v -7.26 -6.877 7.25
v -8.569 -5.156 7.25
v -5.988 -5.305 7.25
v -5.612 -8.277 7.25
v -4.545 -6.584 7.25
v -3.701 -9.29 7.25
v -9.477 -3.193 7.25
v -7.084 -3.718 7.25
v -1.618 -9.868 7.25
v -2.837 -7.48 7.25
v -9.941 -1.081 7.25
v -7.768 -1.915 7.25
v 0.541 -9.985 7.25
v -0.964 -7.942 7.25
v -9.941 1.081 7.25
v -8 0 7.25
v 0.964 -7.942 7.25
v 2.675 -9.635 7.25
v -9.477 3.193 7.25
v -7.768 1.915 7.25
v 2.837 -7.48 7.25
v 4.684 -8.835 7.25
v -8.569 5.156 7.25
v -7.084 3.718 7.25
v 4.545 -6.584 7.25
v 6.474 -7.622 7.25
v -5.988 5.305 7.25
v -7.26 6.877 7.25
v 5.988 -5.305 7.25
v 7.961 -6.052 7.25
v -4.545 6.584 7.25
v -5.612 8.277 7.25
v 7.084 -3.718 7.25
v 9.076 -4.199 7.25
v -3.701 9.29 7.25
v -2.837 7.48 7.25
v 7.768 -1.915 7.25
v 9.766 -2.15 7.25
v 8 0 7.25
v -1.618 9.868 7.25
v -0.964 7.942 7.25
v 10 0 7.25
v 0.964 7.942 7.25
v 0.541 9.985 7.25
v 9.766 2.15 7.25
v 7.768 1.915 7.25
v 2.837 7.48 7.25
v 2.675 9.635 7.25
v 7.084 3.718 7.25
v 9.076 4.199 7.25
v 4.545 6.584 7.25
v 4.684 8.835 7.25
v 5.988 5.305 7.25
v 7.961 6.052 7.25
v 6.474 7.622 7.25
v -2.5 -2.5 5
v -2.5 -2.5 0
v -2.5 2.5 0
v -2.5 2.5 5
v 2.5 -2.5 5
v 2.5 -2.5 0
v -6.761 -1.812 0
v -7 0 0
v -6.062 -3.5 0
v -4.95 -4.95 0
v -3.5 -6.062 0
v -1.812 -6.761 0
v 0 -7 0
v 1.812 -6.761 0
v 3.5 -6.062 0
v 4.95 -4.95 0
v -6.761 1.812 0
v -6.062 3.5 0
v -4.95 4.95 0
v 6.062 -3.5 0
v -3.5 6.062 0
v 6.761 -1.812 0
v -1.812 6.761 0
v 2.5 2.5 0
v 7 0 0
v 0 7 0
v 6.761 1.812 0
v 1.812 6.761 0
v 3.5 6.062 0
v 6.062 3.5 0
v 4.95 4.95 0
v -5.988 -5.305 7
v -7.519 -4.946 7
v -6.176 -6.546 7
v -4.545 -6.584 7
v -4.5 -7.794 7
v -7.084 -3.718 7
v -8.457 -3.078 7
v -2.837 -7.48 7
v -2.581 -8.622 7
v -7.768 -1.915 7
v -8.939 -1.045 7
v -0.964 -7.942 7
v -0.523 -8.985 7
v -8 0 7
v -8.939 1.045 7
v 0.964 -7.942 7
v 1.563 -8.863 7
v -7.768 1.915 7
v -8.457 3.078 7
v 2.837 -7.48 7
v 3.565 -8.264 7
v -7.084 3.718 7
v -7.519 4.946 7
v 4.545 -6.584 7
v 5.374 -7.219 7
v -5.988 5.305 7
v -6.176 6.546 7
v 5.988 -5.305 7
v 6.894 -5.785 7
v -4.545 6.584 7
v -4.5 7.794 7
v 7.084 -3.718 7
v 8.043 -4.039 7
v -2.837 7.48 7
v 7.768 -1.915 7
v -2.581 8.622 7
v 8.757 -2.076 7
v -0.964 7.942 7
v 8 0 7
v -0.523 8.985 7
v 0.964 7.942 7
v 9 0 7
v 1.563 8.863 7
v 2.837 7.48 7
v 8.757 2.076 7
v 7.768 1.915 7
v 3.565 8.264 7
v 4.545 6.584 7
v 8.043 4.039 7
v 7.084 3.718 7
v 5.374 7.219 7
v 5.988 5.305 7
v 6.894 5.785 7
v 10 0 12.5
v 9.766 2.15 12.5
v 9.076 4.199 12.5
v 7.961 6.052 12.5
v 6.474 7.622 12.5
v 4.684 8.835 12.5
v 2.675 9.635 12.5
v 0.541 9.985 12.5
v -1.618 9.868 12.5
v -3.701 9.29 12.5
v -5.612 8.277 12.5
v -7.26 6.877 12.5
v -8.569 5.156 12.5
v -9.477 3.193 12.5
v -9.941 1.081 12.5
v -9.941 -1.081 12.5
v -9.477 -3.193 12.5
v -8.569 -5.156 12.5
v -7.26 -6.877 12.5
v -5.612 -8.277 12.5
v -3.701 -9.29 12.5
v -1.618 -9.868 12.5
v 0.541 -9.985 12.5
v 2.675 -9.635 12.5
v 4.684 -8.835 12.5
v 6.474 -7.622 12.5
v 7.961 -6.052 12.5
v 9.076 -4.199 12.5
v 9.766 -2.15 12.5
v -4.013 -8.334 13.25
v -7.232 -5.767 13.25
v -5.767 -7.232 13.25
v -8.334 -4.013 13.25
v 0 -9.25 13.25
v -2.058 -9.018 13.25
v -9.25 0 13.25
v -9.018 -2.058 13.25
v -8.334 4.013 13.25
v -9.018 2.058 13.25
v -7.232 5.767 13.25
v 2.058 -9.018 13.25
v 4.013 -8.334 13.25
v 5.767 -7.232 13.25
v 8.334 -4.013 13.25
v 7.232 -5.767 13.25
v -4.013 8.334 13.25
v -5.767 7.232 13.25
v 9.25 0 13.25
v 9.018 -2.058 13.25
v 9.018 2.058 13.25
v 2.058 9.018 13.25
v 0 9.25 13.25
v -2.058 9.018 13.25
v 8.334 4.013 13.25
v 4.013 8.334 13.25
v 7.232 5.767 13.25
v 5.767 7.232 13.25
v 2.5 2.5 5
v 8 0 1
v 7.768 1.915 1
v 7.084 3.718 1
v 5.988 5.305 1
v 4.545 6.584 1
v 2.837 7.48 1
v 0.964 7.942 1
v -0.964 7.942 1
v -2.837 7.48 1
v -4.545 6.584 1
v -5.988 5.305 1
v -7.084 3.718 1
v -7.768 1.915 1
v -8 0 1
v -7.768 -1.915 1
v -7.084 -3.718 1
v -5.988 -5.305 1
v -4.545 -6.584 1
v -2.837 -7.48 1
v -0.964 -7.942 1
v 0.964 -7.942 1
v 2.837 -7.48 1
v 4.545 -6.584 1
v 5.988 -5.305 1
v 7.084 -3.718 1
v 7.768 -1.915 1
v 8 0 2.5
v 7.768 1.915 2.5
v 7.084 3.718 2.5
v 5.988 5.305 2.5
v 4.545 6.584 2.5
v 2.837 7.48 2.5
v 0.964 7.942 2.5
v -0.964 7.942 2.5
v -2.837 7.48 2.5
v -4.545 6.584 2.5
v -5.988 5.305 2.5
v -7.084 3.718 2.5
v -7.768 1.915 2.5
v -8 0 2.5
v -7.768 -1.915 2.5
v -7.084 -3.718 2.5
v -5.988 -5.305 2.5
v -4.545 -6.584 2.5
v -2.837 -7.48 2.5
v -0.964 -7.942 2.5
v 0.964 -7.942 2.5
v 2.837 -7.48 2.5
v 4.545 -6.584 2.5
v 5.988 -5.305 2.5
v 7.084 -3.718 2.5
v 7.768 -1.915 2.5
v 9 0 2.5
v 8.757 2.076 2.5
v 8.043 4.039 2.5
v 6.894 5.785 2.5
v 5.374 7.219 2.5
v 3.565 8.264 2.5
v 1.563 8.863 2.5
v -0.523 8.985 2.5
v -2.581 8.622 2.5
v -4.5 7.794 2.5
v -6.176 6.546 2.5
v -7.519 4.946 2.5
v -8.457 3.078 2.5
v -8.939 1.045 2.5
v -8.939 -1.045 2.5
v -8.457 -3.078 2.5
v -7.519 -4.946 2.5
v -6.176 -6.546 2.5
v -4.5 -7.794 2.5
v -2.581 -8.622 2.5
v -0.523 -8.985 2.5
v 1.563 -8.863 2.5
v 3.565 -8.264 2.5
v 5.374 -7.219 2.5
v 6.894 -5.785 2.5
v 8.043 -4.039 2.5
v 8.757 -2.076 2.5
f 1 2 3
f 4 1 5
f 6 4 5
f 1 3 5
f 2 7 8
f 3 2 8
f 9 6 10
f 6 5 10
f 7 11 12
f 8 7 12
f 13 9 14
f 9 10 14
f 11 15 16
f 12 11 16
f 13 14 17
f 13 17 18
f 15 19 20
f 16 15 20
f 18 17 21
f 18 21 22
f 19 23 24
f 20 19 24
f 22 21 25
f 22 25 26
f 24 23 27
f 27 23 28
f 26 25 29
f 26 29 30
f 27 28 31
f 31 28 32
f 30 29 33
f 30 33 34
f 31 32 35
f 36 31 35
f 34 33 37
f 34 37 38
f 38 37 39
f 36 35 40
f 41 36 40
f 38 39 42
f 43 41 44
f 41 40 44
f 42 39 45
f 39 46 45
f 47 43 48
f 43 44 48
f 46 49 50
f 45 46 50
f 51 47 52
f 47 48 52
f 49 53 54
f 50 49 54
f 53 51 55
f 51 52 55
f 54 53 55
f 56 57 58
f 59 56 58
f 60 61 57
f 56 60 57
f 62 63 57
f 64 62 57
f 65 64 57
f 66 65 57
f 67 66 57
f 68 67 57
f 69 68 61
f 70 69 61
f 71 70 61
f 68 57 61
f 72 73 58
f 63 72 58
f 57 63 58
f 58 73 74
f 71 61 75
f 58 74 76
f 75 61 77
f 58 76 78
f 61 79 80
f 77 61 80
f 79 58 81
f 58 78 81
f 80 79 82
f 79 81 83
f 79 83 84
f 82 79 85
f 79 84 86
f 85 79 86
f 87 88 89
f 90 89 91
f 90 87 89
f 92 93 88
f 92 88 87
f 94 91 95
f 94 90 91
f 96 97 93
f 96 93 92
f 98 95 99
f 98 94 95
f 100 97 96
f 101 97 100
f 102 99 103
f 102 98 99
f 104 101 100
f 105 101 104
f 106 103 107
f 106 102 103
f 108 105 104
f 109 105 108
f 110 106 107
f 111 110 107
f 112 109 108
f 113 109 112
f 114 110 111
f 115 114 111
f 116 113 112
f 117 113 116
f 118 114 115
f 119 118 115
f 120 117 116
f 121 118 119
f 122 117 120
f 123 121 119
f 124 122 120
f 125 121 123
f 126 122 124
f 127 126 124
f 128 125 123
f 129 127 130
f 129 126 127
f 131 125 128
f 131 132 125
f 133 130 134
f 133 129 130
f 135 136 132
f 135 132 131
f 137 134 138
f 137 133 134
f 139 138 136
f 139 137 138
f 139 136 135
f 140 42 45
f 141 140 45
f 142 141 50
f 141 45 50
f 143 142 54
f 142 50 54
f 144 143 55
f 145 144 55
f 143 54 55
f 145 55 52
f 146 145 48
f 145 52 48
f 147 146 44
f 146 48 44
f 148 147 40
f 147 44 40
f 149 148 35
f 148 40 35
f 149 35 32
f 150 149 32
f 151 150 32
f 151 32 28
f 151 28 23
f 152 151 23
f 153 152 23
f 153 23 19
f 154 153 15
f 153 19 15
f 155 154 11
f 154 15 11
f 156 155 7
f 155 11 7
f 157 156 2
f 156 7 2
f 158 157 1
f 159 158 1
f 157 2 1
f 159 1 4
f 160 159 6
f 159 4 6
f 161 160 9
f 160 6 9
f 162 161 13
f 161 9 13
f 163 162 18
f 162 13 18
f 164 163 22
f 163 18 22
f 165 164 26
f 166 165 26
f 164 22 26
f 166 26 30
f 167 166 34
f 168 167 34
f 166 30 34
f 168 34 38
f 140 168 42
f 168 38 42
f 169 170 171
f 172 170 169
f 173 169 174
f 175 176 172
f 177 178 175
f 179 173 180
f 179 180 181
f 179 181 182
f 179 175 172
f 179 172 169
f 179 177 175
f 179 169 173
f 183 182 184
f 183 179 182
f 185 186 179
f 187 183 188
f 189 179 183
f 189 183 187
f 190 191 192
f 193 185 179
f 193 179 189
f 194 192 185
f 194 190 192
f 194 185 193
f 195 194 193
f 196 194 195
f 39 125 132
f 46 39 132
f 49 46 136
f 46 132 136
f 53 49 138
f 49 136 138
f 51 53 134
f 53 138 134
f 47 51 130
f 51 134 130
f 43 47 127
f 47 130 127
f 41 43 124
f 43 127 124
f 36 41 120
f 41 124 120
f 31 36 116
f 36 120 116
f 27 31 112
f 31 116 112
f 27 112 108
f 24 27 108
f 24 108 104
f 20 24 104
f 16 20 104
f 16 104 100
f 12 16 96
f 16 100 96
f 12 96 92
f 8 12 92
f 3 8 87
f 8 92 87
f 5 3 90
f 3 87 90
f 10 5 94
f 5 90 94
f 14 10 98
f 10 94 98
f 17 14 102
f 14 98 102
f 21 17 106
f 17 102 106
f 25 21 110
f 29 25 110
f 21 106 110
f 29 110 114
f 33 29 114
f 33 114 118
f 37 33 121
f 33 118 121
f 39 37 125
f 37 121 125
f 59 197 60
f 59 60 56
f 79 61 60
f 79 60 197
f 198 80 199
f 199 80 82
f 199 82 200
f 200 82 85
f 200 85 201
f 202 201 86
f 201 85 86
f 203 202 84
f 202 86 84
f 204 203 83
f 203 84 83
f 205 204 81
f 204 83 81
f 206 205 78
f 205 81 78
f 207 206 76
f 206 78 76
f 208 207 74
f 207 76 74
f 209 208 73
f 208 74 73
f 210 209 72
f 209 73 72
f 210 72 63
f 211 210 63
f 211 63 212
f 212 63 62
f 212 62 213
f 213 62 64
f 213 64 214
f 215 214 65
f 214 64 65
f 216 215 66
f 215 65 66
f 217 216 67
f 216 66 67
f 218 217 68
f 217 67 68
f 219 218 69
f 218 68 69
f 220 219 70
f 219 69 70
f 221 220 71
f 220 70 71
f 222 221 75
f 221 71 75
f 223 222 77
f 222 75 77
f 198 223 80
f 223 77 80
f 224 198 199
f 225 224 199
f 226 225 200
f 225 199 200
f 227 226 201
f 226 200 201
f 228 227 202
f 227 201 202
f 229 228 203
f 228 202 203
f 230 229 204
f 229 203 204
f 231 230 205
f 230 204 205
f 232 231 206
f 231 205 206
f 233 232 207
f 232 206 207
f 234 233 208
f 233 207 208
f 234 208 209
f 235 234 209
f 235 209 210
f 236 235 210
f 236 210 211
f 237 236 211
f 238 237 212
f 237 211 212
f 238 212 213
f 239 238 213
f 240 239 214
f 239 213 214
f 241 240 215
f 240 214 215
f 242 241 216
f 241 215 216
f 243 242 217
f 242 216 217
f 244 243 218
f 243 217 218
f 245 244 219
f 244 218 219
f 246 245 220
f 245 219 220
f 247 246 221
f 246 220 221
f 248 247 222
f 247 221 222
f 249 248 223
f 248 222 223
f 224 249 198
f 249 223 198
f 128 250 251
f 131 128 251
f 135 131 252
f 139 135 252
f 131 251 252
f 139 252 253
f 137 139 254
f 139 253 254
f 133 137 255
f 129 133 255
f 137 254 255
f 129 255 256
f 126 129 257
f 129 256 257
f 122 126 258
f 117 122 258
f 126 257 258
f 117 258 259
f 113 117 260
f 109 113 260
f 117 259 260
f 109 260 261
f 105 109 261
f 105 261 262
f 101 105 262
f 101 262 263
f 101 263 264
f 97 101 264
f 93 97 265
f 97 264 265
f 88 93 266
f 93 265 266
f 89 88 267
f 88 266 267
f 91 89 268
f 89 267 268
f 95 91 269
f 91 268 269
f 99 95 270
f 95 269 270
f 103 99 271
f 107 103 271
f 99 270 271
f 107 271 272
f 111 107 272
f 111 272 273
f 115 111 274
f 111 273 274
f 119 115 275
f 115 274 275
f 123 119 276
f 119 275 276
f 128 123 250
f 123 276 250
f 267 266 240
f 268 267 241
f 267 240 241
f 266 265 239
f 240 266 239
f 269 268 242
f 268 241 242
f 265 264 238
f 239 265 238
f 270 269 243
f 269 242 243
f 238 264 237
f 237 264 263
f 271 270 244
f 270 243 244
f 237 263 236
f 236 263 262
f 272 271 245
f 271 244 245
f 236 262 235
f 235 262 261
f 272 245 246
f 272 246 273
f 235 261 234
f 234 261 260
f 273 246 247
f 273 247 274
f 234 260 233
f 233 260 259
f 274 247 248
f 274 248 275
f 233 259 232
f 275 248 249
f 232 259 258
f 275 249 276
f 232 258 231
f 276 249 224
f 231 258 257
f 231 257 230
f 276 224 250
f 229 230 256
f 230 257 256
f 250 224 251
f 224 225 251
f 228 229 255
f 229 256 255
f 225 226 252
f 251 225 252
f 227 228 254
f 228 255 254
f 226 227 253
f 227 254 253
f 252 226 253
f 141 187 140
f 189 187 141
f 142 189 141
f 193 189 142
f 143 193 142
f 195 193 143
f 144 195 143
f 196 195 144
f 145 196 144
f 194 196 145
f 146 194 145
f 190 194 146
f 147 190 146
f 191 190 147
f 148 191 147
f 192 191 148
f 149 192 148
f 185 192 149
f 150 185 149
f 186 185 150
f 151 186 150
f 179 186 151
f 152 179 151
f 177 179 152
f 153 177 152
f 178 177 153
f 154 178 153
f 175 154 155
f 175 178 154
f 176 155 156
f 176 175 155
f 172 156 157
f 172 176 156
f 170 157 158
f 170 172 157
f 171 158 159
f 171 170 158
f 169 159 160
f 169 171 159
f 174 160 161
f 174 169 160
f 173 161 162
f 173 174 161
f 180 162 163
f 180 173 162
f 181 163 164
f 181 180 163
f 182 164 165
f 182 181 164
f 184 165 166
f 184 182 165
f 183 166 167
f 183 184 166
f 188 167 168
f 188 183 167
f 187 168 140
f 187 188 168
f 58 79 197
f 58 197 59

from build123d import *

# Parameters (mm, degrees)
SKETCH1_R           = 8
BOSS_EXTRUDE1_DEPTH = 2.5
SKETCH2_R           = 9
BOSS_EXTRUDE2_DEPTH = 4.5
SKETCH3_R           = 8
BOSS_EXTRUDE3_DEPTH = 0.25
SKETCH4_R           = 10
BOSS_EXTRUDE4_DEPTH = 6
SKETCH5_W           = 5
SKETCH5_H           = 5
CUT_EXTRUDE1_DEPTH  = 5
CHAMFER1_SIZE       = 1
CHAMFER2_SIZE       = 0.75


with BuildPart() as part:
    # Sketch1 → Boss-Extrude1 (new body)
    with BuildSketch(Plane.XY):
        Circle(SKETCH1_R)
    extrude(amount=BOSS_EXTRUDE1_DEPTH)

    # Sketch2 → Boss-Extrude2 (add)
    with BuildSketch(Plane.XY.offset(2.5)):
        Circle(SKETCH2_R)
    extrude(amount=BOSS_EXTRUDE2_DEPTH)

    # Sketch3 → Boss-Extrude3 (add)
    with BuildSketch(Plane.XY.offset(7)):
        Circle(SKETCH3_R)
    extrude(amount=BOSS_EXTRUDE3_DEPTH)

    # Sketch4 → Boss-Extrude4 (add)
    with BuildSketch(Plane.XY.offset(7.25)):
        Circle(SKETCH4_R)
    extrude(amount=BOSS_EXTRUDE4_DEPTH)

    # Sketch5 → Cut-Extrude1 (cut)
    with BuildSketch(Plane(origin=(0, 0, 0), x_dir=(-1, 0, 0), z_dir=(0, 0, -1))):
        Rectangle(SKETCH5_W, SKETCH5_H)
    extrude(amount=-CUT_EXTRUDE1_DEPTH, mode=Mode.SUBTRACT)

    # Chamfer1
    chamfer1_edges = [part.edges().sort_by_distance(p)[0] for p in [
        (-8, 0, 0),
    ]]
    chamfer(chamfer1_edges, length=CHAMFER1_SIZE)

    # Chamfer2
    chamfer2_edges = [part.edges().sort_by_distance(p)[0] for p in [
        (-10, 0, 13.25),
    ]]
    chamfer(chamfer2_edges, length=CHAMFER2_SIZE)


solid = part.part
